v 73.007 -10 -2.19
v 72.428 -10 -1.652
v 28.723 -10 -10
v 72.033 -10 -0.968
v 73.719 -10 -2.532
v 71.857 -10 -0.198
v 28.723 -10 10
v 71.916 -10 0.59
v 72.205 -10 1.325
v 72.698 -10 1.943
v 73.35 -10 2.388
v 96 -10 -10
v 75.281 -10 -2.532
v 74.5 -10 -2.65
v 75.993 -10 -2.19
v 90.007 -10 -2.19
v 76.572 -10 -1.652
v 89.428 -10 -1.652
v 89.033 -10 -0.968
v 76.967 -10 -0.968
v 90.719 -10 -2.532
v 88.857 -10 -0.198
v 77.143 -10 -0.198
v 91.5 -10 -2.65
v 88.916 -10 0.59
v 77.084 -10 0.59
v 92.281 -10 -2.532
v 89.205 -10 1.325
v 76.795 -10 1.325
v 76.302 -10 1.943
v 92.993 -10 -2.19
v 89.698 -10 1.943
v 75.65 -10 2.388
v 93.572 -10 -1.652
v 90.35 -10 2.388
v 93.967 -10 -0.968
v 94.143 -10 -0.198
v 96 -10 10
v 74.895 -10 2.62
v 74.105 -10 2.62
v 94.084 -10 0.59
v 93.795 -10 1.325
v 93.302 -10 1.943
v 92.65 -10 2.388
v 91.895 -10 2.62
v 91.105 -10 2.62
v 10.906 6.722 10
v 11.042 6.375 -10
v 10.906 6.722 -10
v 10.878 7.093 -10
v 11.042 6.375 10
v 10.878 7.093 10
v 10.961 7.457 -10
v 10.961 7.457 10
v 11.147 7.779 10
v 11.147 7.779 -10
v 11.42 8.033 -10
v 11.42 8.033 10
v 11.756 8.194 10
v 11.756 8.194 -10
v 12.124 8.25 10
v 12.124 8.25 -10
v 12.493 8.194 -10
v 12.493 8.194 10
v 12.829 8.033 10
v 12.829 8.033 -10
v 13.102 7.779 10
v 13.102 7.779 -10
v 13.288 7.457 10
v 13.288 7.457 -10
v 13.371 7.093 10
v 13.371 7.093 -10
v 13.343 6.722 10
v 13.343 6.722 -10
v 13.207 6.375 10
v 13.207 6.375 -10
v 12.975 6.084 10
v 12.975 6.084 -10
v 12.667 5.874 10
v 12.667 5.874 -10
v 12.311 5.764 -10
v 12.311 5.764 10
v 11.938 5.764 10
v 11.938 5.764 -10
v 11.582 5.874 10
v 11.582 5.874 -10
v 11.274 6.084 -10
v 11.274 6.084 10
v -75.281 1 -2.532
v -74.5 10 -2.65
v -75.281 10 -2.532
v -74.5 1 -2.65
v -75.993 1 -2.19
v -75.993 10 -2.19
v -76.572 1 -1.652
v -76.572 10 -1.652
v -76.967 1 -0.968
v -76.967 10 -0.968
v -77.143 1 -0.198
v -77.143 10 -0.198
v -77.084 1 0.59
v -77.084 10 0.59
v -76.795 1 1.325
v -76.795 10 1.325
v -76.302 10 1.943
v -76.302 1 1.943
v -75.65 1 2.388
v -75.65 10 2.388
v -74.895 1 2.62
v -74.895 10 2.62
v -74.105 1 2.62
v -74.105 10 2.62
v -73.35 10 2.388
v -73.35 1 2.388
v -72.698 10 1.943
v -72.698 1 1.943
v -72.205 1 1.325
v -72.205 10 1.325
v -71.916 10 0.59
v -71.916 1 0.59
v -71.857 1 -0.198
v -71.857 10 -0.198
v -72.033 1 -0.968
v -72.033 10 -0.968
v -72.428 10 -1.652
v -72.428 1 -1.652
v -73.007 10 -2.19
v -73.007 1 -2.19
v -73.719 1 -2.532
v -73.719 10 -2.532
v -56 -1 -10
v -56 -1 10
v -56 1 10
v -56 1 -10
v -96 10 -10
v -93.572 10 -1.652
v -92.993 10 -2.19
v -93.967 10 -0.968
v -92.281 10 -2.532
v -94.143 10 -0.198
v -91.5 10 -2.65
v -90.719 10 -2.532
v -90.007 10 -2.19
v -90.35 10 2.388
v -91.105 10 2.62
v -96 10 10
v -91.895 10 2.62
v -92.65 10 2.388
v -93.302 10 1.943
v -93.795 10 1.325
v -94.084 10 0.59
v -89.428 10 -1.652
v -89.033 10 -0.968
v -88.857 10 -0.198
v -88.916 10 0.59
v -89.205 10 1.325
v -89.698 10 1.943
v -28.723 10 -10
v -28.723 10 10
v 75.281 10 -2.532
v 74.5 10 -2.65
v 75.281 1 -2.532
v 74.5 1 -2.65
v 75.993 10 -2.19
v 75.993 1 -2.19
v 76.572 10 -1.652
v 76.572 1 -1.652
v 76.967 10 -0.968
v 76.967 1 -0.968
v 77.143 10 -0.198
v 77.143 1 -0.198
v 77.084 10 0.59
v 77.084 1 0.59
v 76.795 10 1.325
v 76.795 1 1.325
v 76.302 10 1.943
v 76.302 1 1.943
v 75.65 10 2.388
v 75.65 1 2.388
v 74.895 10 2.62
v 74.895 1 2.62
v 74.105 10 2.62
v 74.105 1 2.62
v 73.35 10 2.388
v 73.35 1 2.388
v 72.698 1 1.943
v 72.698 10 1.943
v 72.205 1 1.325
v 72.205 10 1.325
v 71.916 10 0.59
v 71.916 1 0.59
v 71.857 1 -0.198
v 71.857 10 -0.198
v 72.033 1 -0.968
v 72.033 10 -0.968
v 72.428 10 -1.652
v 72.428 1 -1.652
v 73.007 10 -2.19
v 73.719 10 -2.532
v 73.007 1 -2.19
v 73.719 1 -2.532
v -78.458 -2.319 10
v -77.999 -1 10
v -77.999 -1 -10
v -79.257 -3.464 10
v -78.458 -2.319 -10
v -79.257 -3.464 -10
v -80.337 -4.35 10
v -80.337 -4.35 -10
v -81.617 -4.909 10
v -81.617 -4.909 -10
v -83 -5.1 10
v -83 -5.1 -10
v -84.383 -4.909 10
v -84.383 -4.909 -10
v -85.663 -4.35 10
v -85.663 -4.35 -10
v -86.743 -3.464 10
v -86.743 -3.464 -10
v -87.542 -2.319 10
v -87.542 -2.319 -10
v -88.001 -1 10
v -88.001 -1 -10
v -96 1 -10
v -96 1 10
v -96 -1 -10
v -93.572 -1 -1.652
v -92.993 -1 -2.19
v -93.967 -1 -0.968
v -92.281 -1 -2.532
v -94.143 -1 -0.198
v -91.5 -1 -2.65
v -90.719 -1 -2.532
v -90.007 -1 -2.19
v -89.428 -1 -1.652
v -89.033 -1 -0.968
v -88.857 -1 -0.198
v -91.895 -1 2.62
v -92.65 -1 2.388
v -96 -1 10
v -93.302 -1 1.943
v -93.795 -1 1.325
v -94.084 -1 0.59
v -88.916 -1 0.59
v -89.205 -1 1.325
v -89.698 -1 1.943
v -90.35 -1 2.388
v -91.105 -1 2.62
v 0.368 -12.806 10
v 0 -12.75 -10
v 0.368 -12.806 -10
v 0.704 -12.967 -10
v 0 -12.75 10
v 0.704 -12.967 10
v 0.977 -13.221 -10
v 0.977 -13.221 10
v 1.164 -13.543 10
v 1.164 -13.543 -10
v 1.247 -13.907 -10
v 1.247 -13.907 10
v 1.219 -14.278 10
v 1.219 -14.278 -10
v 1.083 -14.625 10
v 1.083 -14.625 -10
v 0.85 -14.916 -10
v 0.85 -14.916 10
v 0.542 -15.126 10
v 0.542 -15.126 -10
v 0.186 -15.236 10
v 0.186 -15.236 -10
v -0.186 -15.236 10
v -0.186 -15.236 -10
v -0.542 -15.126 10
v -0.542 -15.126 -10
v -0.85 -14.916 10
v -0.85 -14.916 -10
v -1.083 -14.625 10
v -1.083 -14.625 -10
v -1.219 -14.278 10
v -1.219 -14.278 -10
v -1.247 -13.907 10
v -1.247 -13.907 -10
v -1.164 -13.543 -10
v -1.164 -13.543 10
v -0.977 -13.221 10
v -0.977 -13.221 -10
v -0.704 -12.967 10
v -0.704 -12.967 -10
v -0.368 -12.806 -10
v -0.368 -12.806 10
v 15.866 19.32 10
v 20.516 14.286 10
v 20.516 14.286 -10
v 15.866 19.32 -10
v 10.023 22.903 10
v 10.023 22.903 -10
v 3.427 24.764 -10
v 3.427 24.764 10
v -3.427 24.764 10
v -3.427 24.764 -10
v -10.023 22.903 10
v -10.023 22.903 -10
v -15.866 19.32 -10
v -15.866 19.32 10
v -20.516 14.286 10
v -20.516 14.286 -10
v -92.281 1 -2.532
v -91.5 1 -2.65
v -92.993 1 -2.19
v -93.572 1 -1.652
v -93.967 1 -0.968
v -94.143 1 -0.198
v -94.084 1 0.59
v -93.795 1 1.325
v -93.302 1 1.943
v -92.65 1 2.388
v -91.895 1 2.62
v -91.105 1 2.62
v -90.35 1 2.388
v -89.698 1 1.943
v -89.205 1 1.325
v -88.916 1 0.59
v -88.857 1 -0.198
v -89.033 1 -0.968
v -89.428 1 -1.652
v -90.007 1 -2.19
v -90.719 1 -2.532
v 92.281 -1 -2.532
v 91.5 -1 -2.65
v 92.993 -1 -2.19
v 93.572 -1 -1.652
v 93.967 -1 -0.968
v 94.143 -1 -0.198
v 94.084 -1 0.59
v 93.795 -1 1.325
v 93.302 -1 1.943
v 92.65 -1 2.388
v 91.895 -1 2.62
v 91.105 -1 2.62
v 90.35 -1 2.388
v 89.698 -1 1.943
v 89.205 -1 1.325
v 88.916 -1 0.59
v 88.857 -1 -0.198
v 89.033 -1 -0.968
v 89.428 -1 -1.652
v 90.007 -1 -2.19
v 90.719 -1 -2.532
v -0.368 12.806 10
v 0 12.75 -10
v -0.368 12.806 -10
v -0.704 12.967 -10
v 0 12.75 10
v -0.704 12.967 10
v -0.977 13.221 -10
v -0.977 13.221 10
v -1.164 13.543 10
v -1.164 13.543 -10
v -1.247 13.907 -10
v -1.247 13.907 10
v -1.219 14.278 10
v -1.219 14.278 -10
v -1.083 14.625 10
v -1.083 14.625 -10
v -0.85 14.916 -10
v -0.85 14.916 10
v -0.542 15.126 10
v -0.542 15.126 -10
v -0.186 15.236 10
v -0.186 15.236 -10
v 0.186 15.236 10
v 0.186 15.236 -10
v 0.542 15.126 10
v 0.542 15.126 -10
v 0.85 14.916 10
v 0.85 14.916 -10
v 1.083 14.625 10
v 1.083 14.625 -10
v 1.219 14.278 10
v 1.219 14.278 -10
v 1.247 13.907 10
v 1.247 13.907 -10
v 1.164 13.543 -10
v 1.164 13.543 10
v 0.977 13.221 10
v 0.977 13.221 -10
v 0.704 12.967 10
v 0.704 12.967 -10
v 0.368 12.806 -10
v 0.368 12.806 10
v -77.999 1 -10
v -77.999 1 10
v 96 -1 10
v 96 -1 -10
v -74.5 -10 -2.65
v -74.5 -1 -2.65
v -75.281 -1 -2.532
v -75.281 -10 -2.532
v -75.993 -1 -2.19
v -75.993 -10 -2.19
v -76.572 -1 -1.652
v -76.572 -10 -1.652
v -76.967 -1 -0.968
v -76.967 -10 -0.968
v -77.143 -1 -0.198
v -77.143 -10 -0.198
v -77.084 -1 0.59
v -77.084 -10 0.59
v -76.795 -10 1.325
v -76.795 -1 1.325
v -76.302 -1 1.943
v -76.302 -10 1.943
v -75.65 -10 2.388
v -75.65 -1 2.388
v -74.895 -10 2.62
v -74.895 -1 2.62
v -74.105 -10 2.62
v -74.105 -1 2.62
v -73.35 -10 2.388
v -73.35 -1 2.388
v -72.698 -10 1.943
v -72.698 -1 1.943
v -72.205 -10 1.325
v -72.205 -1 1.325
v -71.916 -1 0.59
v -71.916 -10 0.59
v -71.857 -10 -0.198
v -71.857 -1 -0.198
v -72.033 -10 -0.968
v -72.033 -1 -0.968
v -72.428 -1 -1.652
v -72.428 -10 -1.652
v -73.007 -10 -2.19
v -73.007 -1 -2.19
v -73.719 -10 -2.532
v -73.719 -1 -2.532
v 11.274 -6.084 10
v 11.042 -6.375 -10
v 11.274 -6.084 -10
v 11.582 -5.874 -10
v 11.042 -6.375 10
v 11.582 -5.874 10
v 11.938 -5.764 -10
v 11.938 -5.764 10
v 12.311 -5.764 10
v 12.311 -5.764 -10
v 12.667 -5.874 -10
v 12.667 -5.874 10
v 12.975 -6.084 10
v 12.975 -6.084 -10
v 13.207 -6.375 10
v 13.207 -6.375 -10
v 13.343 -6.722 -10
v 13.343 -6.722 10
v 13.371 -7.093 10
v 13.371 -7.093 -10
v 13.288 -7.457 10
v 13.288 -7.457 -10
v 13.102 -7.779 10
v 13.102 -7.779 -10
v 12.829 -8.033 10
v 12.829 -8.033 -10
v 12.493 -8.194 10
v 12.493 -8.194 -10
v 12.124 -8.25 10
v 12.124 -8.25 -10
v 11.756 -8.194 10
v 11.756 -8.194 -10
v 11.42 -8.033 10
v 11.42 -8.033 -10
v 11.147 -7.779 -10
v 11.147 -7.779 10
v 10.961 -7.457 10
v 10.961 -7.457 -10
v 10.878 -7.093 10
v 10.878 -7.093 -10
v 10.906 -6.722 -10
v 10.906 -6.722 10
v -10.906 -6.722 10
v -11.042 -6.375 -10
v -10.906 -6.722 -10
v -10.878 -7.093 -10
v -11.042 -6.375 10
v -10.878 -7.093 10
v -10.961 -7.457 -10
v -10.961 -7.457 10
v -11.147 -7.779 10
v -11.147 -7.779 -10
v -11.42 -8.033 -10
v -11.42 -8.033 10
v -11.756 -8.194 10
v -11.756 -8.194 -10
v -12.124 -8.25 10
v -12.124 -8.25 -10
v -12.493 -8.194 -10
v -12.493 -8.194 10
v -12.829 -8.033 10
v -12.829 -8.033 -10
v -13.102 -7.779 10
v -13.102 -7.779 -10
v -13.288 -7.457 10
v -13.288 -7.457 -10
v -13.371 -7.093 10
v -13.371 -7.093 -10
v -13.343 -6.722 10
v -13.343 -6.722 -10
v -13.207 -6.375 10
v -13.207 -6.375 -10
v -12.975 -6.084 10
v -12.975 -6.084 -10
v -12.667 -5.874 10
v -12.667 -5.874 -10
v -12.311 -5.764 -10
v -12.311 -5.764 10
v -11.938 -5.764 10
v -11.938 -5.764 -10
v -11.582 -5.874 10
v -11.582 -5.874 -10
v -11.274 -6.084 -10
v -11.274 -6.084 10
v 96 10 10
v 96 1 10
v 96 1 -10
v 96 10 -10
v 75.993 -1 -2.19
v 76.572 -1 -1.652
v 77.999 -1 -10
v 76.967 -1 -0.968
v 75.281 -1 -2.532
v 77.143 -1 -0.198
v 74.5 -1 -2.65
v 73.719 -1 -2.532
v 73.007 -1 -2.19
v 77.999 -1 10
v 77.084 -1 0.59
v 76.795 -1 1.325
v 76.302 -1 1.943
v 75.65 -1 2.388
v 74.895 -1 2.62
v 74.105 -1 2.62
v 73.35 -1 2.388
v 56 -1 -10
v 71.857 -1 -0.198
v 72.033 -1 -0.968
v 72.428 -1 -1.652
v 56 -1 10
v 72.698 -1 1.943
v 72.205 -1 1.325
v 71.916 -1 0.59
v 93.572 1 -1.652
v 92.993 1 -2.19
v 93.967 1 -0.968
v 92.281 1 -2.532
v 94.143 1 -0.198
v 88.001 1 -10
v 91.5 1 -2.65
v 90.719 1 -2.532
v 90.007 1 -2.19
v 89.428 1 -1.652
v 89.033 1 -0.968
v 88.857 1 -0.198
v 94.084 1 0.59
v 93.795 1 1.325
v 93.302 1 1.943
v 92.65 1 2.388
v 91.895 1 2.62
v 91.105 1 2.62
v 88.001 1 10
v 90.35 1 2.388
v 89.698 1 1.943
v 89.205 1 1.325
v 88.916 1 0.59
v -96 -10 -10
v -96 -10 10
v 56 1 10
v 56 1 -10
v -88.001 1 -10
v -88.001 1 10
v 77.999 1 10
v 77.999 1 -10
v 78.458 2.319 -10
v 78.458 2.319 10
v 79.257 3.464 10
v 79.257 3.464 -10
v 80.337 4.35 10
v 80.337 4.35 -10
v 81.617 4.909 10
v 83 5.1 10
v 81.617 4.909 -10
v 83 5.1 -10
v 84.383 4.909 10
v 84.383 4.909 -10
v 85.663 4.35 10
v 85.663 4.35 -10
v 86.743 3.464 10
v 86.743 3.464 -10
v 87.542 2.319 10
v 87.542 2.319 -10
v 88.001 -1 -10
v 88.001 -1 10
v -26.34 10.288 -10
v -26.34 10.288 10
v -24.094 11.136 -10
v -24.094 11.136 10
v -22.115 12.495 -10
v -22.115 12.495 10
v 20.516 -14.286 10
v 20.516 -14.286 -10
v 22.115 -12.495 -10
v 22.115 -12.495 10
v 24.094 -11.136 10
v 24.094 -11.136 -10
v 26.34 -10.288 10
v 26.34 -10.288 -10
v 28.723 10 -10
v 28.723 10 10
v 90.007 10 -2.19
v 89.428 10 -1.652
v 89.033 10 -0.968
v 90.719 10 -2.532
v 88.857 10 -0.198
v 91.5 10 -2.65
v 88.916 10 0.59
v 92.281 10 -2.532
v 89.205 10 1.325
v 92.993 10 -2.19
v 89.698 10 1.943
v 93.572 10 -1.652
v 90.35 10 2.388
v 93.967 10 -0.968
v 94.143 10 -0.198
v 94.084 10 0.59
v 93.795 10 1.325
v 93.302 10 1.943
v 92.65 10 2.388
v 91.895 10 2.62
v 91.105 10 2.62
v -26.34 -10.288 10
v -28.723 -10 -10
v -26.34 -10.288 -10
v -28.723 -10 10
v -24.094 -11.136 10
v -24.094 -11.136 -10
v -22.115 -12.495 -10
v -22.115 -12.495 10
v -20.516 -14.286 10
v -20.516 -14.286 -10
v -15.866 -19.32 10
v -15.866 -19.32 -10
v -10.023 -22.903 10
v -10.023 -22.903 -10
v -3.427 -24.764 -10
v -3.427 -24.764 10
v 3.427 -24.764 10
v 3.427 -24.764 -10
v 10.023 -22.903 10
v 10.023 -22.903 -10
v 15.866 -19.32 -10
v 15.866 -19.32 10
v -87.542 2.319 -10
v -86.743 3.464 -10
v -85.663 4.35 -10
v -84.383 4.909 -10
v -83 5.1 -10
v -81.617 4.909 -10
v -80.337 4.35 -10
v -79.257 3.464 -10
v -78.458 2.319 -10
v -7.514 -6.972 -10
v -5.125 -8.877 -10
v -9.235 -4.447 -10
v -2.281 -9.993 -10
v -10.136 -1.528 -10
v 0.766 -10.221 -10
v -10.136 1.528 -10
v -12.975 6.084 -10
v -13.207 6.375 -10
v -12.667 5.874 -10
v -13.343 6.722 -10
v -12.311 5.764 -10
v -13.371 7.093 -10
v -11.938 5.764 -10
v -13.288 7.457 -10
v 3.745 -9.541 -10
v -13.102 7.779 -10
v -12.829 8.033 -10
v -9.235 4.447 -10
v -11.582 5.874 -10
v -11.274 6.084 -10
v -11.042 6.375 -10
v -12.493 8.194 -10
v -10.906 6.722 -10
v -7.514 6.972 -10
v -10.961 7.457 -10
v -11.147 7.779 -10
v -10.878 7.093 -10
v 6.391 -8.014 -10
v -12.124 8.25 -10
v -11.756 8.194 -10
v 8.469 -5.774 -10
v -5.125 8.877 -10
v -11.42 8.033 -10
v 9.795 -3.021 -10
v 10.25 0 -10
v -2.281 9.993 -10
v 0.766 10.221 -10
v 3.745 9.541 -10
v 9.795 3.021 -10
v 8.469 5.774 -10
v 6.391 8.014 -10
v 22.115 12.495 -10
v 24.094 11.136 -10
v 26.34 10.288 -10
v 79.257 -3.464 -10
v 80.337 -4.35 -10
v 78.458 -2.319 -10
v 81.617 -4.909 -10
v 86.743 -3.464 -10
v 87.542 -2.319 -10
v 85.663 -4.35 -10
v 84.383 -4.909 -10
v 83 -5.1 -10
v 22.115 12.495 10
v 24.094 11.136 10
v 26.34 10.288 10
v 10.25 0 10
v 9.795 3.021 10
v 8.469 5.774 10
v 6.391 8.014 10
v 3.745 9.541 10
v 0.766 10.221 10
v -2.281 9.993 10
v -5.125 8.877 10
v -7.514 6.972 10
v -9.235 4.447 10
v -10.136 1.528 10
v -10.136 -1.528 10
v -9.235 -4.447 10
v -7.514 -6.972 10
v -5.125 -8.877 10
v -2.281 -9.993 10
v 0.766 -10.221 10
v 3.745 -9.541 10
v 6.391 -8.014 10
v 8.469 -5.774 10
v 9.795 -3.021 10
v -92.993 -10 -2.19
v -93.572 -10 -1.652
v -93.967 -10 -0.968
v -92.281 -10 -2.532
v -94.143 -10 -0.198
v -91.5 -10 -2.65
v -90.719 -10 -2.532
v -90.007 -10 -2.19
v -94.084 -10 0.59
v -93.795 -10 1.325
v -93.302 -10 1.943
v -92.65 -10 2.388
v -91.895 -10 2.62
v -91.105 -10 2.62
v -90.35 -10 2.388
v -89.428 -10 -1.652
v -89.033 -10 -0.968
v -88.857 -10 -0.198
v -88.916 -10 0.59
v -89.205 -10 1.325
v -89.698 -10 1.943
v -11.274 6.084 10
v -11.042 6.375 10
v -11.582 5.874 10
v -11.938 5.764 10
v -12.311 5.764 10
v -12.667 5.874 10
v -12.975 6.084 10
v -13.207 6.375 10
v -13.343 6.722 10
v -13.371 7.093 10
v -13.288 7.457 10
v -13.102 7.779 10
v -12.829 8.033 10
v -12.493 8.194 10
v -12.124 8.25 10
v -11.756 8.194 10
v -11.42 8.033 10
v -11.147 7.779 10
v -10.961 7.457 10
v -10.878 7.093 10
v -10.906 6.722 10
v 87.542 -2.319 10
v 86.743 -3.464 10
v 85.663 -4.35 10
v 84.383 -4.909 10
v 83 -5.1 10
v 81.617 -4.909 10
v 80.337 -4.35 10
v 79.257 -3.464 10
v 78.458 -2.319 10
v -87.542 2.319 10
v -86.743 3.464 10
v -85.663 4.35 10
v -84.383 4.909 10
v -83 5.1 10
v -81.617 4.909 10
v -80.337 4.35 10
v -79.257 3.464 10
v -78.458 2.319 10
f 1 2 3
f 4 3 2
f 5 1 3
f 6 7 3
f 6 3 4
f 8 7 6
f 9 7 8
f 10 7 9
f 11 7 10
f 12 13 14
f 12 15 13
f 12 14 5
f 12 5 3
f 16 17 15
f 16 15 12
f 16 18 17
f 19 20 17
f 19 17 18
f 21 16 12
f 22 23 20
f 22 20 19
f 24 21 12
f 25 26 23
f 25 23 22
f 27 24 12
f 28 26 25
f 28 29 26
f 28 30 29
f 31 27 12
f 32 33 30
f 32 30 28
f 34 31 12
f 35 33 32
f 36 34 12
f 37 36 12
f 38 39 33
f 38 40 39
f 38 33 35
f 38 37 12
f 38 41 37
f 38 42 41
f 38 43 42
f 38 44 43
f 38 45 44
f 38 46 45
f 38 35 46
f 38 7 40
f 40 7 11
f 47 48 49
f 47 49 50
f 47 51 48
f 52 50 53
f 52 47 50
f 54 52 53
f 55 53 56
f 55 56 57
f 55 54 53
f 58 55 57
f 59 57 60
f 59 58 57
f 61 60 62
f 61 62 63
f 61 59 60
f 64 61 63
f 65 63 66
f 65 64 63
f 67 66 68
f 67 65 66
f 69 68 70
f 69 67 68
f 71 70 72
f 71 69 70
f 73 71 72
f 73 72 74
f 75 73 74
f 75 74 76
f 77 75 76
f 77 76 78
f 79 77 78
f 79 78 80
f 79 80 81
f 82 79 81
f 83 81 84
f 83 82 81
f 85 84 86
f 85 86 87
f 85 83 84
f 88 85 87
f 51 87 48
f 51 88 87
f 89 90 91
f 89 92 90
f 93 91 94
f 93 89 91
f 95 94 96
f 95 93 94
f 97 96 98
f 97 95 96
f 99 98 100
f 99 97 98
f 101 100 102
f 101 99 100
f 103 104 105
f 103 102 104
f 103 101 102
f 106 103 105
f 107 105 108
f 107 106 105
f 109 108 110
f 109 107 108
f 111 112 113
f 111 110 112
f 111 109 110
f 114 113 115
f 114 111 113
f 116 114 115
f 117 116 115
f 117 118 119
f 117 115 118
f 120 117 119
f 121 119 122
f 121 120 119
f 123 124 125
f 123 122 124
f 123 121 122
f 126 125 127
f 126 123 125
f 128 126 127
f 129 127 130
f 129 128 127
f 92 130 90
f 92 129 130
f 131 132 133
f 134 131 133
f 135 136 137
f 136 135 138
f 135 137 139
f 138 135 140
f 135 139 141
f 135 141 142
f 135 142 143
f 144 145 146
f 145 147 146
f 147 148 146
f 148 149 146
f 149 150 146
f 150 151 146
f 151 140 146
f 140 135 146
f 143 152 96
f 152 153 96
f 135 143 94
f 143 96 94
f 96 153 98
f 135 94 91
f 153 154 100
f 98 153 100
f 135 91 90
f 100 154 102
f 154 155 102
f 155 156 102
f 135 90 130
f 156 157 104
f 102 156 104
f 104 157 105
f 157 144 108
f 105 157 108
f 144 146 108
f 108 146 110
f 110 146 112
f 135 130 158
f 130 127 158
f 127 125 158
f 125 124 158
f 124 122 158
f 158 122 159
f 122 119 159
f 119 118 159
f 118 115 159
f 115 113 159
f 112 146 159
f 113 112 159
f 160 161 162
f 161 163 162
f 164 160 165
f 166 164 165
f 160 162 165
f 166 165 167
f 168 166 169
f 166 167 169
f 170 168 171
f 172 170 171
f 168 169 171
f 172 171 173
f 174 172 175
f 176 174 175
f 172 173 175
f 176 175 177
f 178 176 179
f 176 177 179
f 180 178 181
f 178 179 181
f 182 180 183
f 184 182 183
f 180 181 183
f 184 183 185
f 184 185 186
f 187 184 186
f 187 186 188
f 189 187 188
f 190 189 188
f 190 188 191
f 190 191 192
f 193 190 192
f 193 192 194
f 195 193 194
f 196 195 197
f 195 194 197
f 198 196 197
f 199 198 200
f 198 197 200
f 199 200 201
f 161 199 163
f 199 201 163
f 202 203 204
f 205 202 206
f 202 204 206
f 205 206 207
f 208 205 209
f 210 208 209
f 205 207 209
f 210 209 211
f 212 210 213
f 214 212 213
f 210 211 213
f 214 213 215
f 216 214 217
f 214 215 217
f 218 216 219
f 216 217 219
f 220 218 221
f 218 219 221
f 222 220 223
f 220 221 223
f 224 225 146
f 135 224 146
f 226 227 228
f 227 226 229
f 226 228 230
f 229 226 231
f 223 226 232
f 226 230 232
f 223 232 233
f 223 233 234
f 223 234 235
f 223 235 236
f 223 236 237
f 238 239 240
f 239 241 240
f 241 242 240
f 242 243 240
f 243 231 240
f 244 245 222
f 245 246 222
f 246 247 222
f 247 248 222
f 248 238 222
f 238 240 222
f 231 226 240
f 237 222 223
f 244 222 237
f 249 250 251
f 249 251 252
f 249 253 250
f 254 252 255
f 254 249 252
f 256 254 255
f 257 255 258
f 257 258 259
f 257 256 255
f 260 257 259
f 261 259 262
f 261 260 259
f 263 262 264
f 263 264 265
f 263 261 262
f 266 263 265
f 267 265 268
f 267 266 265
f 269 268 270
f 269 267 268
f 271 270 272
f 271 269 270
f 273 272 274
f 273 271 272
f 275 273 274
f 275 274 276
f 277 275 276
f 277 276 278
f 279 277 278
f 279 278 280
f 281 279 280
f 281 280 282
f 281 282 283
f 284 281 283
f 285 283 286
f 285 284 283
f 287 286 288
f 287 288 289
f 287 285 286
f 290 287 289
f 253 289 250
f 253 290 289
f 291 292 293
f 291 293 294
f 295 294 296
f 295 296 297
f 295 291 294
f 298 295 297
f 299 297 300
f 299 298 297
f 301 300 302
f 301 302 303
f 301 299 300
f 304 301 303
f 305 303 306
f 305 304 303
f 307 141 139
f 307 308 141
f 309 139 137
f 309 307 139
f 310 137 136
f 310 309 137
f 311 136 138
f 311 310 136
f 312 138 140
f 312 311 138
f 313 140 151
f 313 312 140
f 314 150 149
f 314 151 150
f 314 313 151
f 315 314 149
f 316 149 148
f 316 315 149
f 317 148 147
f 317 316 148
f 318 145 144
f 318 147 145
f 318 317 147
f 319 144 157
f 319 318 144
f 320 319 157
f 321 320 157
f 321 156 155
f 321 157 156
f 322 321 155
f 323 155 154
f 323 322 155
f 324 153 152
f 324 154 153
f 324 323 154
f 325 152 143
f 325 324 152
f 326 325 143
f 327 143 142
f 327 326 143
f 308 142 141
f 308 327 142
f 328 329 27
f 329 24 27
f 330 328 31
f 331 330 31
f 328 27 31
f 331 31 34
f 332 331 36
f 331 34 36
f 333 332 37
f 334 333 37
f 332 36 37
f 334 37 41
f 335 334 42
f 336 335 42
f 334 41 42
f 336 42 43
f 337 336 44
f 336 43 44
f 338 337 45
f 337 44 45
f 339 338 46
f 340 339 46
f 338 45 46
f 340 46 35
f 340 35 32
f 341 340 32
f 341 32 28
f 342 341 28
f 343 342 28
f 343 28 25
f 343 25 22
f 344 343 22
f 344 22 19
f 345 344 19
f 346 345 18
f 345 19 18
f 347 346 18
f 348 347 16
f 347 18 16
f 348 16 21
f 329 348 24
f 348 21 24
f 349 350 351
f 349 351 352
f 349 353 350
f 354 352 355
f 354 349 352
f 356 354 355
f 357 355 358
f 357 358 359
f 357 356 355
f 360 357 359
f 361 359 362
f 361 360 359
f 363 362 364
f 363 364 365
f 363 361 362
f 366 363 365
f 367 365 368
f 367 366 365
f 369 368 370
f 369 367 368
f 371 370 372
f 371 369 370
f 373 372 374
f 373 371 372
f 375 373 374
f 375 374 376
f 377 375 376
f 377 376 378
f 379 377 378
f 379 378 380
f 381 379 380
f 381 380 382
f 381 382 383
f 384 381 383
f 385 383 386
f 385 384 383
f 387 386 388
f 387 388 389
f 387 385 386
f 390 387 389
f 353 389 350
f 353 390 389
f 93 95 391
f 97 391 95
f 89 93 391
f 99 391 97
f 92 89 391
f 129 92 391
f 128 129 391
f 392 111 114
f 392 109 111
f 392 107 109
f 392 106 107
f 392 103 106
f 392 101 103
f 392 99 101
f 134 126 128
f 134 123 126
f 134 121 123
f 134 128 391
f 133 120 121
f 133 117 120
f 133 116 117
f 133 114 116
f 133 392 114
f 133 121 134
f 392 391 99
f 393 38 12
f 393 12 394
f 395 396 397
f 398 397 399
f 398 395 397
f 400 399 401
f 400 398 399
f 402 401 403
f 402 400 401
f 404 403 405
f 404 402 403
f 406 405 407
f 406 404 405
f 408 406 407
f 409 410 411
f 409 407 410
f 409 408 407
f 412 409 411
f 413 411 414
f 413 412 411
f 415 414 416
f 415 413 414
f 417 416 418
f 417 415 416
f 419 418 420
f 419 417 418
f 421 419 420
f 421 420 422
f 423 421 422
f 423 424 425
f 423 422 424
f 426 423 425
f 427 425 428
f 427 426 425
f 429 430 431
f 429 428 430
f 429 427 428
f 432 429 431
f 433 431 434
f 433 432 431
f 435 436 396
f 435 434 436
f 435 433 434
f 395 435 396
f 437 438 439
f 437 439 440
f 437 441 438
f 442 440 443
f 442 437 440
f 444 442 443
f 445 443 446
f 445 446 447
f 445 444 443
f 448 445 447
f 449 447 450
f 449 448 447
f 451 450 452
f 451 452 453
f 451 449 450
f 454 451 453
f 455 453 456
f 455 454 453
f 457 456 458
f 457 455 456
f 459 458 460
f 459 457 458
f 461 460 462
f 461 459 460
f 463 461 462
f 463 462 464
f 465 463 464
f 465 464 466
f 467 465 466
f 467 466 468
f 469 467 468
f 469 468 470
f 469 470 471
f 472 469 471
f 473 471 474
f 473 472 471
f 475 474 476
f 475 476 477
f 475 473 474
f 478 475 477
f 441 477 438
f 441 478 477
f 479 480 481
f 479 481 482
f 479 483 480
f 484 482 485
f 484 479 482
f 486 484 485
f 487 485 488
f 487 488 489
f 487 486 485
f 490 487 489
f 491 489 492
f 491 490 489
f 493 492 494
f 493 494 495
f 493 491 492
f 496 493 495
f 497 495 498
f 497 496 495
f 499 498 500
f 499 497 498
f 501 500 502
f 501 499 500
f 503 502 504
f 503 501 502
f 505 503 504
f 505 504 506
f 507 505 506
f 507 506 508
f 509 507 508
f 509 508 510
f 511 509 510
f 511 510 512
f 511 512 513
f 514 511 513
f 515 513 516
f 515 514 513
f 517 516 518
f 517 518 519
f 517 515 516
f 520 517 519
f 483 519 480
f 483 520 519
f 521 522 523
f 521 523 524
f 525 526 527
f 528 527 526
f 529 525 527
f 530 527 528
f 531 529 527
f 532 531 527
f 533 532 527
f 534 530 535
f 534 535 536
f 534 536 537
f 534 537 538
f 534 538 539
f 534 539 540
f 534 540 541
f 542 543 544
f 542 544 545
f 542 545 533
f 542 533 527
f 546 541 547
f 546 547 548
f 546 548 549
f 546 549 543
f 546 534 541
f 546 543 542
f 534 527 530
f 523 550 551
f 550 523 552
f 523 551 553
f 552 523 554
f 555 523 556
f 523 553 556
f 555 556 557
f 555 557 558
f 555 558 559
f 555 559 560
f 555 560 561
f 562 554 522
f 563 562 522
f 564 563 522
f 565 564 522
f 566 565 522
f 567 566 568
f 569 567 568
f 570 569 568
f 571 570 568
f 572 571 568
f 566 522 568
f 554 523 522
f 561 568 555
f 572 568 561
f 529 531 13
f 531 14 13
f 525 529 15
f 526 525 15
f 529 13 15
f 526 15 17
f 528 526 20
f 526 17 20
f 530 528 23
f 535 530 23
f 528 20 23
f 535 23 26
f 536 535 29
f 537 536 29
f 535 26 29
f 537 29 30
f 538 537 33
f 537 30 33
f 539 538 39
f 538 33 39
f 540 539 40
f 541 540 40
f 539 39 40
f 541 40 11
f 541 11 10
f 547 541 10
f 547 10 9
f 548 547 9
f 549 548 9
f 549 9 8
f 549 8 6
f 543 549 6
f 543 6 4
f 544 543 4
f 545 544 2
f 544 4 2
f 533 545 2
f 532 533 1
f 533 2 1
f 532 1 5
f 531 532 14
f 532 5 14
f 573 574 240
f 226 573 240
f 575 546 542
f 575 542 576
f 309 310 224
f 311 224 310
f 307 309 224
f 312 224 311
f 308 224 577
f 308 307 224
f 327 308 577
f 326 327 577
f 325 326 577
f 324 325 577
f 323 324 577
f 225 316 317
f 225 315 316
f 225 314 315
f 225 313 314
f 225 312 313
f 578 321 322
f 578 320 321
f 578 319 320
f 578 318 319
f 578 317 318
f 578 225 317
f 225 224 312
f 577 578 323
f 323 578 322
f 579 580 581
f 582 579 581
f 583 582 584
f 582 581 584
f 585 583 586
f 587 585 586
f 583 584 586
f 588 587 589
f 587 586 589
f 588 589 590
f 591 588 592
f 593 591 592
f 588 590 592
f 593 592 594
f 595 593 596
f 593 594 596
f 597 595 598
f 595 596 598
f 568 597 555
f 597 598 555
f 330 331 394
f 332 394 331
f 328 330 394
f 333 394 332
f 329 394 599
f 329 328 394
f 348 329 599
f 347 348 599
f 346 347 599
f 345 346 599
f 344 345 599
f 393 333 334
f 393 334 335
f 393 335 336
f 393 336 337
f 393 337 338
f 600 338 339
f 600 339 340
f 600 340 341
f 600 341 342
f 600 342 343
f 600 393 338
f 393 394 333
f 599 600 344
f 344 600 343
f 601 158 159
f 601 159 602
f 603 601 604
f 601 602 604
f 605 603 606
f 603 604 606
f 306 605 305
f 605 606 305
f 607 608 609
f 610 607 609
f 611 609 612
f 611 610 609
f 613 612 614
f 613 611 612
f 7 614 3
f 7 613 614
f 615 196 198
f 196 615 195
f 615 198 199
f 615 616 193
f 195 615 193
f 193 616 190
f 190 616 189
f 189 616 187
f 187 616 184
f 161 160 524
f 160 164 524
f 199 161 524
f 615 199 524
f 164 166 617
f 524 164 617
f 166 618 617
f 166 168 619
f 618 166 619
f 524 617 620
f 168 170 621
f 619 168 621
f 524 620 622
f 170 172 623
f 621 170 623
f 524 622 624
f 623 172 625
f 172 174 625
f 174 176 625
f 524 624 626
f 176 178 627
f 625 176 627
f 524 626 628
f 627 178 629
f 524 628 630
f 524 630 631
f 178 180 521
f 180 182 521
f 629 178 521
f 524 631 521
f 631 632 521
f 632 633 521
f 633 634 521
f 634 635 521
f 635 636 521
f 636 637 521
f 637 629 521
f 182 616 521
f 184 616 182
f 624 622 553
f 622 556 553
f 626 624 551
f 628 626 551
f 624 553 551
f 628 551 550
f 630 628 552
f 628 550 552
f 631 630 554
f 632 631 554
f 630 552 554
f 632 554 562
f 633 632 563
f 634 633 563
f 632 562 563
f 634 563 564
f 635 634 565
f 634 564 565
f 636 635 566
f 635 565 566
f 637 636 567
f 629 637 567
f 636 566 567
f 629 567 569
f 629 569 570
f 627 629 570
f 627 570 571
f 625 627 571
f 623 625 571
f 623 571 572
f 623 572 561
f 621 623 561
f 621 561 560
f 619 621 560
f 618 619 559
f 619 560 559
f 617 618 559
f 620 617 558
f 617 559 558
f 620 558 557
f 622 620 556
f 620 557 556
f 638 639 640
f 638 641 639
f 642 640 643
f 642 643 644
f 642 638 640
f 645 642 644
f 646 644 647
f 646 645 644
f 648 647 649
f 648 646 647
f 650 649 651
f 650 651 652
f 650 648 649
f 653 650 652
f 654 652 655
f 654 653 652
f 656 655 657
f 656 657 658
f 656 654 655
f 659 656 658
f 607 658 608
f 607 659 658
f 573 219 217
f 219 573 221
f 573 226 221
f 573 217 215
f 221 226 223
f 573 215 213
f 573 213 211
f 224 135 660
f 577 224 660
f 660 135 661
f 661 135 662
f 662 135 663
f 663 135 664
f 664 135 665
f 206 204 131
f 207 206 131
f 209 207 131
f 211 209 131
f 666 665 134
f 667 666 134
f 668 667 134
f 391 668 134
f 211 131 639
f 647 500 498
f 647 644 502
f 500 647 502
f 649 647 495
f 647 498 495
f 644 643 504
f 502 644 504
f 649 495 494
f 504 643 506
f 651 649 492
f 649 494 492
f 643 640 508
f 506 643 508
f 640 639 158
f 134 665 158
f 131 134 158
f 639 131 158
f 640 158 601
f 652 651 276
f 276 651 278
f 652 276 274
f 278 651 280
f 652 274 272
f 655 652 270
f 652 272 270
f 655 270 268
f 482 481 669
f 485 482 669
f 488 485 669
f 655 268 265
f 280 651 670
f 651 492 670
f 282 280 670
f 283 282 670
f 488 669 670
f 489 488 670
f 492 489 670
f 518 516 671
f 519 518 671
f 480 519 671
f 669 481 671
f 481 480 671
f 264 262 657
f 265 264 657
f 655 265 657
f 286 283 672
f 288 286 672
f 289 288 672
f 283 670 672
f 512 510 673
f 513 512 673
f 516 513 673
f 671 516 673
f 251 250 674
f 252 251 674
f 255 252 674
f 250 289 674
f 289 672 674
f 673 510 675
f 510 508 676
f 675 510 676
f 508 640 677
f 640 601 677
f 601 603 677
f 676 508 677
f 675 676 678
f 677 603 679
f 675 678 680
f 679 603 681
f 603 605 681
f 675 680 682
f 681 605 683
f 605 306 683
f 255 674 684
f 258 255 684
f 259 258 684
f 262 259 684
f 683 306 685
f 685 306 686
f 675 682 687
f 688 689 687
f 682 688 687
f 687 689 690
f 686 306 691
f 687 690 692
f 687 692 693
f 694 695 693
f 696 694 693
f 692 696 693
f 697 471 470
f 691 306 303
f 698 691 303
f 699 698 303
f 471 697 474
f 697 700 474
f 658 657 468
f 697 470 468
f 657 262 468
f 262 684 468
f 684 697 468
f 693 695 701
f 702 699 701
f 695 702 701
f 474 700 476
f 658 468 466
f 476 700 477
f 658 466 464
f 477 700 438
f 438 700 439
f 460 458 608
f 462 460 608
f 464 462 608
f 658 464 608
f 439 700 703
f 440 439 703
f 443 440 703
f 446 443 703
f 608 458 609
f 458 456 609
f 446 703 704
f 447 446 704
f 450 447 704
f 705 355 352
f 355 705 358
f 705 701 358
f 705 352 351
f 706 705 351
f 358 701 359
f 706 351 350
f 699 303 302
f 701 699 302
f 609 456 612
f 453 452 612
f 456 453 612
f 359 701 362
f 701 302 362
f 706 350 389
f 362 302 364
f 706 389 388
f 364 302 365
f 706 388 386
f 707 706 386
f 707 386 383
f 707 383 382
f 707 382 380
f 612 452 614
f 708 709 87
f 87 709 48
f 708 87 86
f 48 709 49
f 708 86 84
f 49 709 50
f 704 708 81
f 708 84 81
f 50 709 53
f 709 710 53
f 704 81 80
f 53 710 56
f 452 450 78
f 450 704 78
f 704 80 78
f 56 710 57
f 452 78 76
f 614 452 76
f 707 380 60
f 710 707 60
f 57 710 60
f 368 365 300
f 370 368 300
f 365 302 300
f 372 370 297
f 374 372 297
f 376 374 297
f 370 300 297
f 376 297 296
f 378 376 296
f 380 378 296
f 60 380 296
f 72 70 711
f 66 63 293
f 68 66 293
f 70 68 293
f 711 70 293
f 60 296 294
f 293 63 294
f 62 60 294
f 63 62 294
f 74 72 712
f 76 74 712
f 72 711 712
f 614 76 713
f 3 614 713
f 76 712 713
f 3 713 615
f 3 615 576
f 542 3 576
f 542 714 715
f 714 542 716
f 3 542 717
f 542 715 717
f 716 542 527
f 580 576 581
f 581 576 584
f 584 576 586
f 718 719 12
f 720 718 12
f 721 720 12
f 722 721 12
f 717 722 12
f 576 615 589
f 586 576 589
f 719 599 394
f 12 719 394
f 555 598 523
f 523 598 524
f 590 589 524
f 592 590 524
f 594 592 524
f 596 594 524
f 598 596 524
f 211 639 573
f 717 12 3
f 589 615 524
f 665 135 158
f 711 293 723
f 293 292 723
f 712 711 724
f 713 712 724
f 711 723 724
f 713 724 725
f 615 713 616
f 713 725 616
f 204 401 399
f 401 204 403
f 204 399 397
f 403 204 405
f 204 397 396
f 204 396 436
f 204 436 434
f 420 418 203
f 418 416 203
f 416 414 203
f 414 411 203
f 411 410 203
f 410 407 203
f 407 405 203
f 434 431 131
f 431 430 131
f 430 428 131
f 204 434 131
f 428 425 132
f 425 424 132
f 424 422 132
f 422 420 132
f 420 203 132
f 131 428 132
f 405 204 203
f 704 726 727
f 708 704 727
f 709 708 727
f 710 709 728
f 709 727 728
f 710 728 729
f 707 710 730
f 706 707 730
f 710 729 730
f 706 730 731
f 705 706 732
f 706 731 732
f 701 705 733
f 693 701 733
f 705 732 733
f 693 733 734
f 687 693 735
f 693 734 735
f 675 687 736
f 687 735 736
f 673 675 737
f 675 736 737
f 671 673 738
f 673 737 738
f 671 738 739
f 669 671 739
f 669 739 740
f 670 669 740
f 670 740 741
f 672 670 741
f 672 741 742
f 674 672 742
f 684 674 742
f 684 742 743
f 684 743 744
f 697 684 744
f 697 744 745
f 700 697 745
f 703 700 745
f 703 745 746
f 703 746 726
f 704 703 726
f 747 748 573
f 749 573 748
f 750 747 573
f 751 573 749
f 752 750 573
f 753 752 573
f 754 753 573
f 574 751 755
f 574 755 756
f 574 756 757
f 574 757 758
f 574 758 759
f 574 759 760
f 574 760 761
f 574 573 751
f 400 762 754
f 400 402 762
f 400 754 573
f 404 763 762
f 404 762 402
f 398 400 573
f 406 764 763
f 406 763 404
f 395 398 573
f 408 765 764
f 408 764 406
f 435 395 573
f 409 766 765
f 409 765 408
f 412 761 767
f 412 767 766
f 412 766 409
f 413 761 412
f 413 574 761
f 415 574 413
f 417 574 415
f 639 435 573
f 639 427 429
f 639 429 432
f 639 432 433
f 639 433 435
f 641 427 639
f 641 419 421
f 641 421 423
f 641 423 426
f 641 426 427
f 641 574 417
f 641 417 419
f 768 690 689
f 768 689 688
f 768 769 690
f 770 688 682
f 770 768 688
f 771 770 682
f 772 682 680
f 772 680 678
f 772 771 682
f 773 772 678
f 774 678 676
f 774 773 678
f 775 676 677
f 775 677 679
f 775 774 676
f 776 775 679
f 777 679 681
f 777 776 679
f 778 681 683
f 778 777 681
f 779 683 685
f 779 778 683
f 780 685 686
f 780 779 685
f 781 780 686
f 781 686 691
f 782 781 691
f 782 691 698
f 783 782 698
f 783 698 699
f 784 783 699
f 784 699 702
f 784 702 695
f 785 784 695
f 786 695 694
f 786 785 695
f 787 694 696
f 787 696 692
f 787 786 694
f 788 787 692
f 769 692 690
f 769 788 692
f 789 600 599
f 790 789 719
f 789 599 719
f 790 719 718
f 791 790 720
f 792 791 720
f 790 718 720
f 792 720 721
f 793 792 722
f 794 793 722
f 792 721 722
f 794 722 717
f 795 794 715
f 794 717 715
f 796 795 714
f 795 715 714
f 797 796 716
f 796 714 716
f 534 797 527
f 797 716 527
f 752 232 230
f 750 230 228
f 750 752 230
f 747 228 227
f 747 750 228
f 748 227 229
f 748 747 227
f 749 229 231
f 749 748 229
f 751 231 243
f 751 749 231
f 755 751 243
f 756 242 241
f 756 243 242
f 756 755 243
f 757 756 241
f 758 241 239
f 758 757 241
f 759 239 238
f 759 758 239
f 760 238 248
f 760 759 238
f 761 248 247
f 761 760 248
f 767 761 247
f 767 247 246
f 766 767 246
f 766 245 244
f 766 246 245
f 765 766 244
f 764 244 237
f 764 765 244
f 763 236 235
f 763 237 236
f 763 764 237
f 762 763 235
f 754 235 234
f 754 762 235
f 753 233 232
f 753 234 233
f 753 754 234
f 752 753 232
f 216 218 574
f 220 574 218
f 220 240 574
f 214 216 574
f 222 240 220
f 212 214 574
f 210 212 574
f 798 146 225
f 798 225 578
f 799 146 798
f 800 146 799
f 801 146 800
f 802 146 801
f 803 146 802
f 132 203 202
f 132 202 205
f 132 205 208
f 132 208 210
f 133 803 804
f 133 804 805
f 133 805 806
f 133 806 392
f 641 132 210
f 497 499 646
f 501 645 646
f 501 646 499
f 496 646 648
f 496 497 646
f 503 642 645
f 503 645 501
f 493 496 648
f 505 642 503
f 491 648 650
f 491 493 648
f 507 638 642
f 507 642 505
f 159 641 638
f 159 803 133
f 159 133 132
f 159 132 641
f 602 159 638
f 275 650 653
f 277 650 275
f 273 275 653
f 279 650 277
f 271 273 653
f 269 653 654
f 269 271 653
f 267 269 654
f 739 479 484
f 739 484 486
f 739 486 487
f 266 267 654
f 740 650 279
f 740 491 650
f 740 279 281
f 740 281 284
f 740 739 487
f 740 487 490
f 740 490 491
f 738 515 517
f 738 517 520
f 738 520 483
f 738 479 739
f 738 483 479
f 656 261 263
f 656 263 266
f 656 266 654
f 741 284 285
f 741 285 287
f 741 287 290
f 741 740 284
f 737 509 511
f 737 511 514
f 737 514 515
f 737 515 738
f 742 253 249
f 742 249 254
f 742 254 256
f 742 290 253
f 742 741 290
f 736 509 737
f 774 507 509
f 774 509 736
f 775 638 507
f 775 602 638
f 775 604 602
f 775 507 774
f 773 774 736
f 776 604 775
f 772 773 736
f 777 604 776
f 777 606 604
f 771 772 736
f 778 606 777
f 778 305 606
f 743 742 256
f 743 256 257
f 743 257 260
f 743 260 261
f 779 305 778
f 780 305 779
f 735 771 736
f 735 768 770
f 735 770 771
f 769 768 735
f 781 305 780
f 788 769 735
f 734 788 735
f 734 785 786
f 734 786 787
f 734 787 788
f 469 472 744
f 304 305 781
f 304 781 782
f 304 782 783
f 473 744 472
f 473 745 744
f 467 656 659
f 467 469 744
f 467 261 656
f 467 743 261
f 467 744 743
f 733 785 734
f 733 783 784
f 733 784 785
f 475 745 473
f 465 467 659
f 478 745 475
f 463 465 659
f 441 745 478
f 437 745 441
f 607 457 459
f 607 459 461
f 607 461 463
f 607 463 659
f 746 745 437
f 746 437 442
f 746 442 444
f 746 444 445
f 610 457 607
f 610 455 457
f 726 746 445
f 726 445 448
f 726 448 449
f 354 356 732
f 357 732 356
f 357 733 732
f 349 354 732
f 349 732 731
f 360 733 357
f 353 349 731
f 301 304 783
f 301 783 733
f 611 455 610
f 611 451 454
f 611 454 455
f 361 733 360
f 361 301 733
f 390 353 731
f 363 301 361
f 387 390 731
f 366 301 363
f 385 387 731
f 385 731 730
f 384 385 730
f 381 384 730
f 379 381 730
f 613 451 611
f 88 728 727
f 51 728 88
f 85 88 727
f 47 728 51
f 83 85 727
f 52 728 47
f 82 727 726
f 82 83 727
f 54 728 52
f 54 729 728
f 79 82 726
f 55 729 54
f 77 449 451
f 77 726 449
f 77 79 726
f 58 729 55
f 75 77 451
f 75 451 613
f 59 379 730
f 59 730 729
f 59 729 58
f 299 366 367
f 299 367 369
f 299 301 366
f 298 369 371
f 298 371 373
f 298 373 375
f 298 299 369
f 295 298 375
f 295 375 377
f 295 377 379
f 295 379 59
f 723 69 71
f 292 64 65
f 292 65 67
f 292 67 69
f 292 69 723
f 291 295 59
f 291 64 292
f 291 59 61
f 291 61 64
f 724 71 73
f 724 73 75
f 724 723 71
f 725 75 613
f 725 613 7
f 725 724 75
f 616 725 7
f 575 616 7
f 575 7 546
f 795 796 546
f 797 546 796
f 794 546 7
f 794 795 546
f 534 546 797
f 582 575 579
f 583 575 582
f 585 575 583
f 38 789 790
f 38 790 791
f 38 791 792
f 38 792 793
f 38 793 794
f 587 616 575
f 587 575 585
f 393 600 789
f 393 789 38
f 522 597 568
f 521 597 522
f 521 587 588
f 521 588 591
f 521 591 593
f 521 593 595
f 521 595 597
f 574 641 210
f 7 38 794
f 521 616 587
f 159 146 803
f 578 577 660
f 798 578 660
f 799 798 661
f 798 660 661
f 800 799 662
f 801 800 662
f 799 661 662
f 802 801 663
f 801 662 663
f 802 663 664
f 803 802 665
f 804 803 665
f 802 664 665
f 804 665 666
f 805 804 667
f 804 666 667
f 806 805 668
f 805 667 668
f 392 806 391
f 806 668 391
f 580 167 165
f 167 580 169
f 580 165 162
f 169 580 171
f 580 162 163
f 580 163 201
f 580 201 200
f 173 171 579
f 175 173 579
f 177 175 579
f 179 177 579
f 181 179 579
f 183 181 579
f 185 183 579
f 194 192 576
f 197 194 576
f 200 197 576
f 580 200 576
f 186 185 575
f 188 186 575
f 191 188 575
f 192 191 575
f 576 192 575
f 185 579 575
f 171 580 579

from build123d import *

# Parameters (mm, degrees)
CROQUIS1_W                            = 192
CROQUIS1_H                            = 20
SALIENTE_EXTRUIR1_DEPTH               = 10
TALADRO_DE_MARGEN_PARA_M81_D          = 10.2
TALADRO_DE_MARGEN_PARA_M81_DEPTH      = 200
TALADRO_DE_MARGEN_PARA_M81_TIP        = 3.064389157
CROQUIS5_W                            = 40
CROQUIS5_H                            = 2
CORTAR_EXTRUIR1_DEPTH                 = 20
TALADRO_DE_MARGEN_PARA_M51_AT_2_COUNT = 2
TALADRO_DE_MARGEN_PARA_M51_AT_2_PITCH = 17
CROQUIS10_R                           = 25
SALIENTE_EXTRUIR2_DEPTH               = 20
CROQUIS11_R                           = 10.25
CORTAR_EXTRUIR2_DEPTH                 = 30
REDONDEO1_R                           = 10
MATRIZC1_COUNT                        = 6


with BuildPart() as part:
    # Croquis1 → Saliente-Extruir1 (new, symmetric)
    with BuildSketch(Plane.XY):
        Rectangle(CROQUIS1_W, CROQUIS1_H)
    extrude(amount=SALIENTE_EXTRUIR1_DEPTH, both=True)

    # Taladro de margen para M81
    with Locations(Plane.XY.offset(10)):
        with Locations((-83, 0), (83, 0)):
            Hole(TALADRO_DE_MARGEN_PARA_M81_D / 2, depth=TALADRO_DE_MARGEN_PARA_M81_DEPTH)
            with Locations((0, 0, -(TALADRO_DE_MARGEN_PARA_M81_DEPTH + TALADRO_DE_MARGEN_PARA_M81_TIP / 2))):  # 118° drill point
                Cone(0, TALADRO_DE_MARGEN_PARA_M81_D / 2, TALADRO_DE_MARGEN_PARA_M81_TIP, mode=Mode.SUBTRACT)

    # Croquis5 → Cortar-Extruir1 (cut)
    with BuildSketch(Plane.XY.offset(10)):
        with Locations((-76, 0)):
            Rectangle(CROQUIS5_W, CROQUIS5_H)
    cortar_extruir1 = extrude(amount=-CORTAR_EXTRUIR1_DEPTH, mode=Mode.SUBTRACT)

    # Croquis8 → Taladro de margen para M51 (revolve, cut)
    with BuildSketch(Plane(origin=(-91.5, -10, 0), x_dir=(0, 0, -1), z_dir=(1, 0, 0))):
        Polygon((0, 0), (0, 201.59228064), (2.65, 200), (2.65, 0), align=None)
    taladro_de_margen_para_m51 = revolve(axis=Axis((-91.5, -16.35, 0), (0, 1, 0)), mode=Mode.SUBTRACT)

    # Taladro de margen para M51 at 2: Taladro de margen para M51 ×2
    with Locations(*[(i * TALADRO_DE_MARGEN_PARA_M51_AT_2_PITCH, 0, 0) for i in range(1, TALADRO_DE_MARGEN_PARA_M51_AT_2_COUNT)]):
        add(taladro_de_margen_para_m51, mode=Mode.SUBTRACT)

    # Simetría1: Cortar-Extruir1, Taladro de margen para M51 across plane
    add(cortar_extruir1.mirror(Plane(origin=(0, 0, 0), x_dir=(0, 0, 1), z_dir=(1, 0, 0))), mode=Mode.SUBTRACT)
    add(taladro_de_margen_para_m51.mirror(Plane(origin=(0, 0, 0), x_dir=(0, 0, 1), z_dir=(1, 0, 0))), mode=Mode.SUBTRACT)

    # Simetría1 copy 1 sketch → Simetría1 copy 1 (revolve, cut)
    with BuildSketch(Plane(origin=(74.5, -10, 0), x_dir=(0, 0, -1), z_dir=(-1, 0, 0))):
        Polygon((0, 0), (0, -201.59228064), (2.65, -200), (2.65, 0), align=None)
    revolve(axis=Axis((74.5, -16.35, 0), (0, -1, 0)), mode=Mode.SUBTRACT)

    # Croquis10 → Saliente-Extruir2 (add)
    with BuildSketch(Plane.XY.offset(10)):
        Circle(CROQUIS10_R)
    extrude(amount=-SALIENTE_EXTRUIR2_DEPTH)

    # Croquis11 → Cortar-Extruir2 (cut)
    with BuildSketch(Plane.XY.offset(10)):
        Circle(CROQUIS11_R)
    extrude(amount=-CORTAR_EXTRUIR2_DEPTH, mode=Mode.SUBTRACT)

    # Redondeo1
    redondeo1_edges = [part.edges().sort_by_distance(p)[0] for p in [
        (-22.912878475, 10, 0),
        (22.912878475, 10, 0),
        (-22.912878475, -10, 0),
        (22.912878475, -10, 0),
    ]]
    fillet(redondeo1_edges, radius=REDONDEO1_R)

    # Croquis12 → Taladro roscado M31 (revolve, cut)
    with BuildSketch(Plane(origin=(0, 14, 10), x_dir=(0, -1, 0), z_dir=(1, 0, 0))):
        Polygon((0, 0), (0, 20.751075774), (1.25, 20), (1.25, 0), align=None)
    taladro_roscado_m31 = revolve(axis=Axis((0, 14, 16.35), (0, 0, -1)), mode=Mode.SUBTRACT)

    # MatrizC1: Taladro roscado M31 ×6 about axis
    matrizc1_axis = Axis((0, 0, 0), (0, 0, 1))
    for i in range(1, MATRIZC1_COUNT):
        add(taladro_roscado_m31.rotate(matrizc1_axis, i * 360 / MATRIZC1_COUNT), mode=Mode.SUBTRACT)


solid = part.part
